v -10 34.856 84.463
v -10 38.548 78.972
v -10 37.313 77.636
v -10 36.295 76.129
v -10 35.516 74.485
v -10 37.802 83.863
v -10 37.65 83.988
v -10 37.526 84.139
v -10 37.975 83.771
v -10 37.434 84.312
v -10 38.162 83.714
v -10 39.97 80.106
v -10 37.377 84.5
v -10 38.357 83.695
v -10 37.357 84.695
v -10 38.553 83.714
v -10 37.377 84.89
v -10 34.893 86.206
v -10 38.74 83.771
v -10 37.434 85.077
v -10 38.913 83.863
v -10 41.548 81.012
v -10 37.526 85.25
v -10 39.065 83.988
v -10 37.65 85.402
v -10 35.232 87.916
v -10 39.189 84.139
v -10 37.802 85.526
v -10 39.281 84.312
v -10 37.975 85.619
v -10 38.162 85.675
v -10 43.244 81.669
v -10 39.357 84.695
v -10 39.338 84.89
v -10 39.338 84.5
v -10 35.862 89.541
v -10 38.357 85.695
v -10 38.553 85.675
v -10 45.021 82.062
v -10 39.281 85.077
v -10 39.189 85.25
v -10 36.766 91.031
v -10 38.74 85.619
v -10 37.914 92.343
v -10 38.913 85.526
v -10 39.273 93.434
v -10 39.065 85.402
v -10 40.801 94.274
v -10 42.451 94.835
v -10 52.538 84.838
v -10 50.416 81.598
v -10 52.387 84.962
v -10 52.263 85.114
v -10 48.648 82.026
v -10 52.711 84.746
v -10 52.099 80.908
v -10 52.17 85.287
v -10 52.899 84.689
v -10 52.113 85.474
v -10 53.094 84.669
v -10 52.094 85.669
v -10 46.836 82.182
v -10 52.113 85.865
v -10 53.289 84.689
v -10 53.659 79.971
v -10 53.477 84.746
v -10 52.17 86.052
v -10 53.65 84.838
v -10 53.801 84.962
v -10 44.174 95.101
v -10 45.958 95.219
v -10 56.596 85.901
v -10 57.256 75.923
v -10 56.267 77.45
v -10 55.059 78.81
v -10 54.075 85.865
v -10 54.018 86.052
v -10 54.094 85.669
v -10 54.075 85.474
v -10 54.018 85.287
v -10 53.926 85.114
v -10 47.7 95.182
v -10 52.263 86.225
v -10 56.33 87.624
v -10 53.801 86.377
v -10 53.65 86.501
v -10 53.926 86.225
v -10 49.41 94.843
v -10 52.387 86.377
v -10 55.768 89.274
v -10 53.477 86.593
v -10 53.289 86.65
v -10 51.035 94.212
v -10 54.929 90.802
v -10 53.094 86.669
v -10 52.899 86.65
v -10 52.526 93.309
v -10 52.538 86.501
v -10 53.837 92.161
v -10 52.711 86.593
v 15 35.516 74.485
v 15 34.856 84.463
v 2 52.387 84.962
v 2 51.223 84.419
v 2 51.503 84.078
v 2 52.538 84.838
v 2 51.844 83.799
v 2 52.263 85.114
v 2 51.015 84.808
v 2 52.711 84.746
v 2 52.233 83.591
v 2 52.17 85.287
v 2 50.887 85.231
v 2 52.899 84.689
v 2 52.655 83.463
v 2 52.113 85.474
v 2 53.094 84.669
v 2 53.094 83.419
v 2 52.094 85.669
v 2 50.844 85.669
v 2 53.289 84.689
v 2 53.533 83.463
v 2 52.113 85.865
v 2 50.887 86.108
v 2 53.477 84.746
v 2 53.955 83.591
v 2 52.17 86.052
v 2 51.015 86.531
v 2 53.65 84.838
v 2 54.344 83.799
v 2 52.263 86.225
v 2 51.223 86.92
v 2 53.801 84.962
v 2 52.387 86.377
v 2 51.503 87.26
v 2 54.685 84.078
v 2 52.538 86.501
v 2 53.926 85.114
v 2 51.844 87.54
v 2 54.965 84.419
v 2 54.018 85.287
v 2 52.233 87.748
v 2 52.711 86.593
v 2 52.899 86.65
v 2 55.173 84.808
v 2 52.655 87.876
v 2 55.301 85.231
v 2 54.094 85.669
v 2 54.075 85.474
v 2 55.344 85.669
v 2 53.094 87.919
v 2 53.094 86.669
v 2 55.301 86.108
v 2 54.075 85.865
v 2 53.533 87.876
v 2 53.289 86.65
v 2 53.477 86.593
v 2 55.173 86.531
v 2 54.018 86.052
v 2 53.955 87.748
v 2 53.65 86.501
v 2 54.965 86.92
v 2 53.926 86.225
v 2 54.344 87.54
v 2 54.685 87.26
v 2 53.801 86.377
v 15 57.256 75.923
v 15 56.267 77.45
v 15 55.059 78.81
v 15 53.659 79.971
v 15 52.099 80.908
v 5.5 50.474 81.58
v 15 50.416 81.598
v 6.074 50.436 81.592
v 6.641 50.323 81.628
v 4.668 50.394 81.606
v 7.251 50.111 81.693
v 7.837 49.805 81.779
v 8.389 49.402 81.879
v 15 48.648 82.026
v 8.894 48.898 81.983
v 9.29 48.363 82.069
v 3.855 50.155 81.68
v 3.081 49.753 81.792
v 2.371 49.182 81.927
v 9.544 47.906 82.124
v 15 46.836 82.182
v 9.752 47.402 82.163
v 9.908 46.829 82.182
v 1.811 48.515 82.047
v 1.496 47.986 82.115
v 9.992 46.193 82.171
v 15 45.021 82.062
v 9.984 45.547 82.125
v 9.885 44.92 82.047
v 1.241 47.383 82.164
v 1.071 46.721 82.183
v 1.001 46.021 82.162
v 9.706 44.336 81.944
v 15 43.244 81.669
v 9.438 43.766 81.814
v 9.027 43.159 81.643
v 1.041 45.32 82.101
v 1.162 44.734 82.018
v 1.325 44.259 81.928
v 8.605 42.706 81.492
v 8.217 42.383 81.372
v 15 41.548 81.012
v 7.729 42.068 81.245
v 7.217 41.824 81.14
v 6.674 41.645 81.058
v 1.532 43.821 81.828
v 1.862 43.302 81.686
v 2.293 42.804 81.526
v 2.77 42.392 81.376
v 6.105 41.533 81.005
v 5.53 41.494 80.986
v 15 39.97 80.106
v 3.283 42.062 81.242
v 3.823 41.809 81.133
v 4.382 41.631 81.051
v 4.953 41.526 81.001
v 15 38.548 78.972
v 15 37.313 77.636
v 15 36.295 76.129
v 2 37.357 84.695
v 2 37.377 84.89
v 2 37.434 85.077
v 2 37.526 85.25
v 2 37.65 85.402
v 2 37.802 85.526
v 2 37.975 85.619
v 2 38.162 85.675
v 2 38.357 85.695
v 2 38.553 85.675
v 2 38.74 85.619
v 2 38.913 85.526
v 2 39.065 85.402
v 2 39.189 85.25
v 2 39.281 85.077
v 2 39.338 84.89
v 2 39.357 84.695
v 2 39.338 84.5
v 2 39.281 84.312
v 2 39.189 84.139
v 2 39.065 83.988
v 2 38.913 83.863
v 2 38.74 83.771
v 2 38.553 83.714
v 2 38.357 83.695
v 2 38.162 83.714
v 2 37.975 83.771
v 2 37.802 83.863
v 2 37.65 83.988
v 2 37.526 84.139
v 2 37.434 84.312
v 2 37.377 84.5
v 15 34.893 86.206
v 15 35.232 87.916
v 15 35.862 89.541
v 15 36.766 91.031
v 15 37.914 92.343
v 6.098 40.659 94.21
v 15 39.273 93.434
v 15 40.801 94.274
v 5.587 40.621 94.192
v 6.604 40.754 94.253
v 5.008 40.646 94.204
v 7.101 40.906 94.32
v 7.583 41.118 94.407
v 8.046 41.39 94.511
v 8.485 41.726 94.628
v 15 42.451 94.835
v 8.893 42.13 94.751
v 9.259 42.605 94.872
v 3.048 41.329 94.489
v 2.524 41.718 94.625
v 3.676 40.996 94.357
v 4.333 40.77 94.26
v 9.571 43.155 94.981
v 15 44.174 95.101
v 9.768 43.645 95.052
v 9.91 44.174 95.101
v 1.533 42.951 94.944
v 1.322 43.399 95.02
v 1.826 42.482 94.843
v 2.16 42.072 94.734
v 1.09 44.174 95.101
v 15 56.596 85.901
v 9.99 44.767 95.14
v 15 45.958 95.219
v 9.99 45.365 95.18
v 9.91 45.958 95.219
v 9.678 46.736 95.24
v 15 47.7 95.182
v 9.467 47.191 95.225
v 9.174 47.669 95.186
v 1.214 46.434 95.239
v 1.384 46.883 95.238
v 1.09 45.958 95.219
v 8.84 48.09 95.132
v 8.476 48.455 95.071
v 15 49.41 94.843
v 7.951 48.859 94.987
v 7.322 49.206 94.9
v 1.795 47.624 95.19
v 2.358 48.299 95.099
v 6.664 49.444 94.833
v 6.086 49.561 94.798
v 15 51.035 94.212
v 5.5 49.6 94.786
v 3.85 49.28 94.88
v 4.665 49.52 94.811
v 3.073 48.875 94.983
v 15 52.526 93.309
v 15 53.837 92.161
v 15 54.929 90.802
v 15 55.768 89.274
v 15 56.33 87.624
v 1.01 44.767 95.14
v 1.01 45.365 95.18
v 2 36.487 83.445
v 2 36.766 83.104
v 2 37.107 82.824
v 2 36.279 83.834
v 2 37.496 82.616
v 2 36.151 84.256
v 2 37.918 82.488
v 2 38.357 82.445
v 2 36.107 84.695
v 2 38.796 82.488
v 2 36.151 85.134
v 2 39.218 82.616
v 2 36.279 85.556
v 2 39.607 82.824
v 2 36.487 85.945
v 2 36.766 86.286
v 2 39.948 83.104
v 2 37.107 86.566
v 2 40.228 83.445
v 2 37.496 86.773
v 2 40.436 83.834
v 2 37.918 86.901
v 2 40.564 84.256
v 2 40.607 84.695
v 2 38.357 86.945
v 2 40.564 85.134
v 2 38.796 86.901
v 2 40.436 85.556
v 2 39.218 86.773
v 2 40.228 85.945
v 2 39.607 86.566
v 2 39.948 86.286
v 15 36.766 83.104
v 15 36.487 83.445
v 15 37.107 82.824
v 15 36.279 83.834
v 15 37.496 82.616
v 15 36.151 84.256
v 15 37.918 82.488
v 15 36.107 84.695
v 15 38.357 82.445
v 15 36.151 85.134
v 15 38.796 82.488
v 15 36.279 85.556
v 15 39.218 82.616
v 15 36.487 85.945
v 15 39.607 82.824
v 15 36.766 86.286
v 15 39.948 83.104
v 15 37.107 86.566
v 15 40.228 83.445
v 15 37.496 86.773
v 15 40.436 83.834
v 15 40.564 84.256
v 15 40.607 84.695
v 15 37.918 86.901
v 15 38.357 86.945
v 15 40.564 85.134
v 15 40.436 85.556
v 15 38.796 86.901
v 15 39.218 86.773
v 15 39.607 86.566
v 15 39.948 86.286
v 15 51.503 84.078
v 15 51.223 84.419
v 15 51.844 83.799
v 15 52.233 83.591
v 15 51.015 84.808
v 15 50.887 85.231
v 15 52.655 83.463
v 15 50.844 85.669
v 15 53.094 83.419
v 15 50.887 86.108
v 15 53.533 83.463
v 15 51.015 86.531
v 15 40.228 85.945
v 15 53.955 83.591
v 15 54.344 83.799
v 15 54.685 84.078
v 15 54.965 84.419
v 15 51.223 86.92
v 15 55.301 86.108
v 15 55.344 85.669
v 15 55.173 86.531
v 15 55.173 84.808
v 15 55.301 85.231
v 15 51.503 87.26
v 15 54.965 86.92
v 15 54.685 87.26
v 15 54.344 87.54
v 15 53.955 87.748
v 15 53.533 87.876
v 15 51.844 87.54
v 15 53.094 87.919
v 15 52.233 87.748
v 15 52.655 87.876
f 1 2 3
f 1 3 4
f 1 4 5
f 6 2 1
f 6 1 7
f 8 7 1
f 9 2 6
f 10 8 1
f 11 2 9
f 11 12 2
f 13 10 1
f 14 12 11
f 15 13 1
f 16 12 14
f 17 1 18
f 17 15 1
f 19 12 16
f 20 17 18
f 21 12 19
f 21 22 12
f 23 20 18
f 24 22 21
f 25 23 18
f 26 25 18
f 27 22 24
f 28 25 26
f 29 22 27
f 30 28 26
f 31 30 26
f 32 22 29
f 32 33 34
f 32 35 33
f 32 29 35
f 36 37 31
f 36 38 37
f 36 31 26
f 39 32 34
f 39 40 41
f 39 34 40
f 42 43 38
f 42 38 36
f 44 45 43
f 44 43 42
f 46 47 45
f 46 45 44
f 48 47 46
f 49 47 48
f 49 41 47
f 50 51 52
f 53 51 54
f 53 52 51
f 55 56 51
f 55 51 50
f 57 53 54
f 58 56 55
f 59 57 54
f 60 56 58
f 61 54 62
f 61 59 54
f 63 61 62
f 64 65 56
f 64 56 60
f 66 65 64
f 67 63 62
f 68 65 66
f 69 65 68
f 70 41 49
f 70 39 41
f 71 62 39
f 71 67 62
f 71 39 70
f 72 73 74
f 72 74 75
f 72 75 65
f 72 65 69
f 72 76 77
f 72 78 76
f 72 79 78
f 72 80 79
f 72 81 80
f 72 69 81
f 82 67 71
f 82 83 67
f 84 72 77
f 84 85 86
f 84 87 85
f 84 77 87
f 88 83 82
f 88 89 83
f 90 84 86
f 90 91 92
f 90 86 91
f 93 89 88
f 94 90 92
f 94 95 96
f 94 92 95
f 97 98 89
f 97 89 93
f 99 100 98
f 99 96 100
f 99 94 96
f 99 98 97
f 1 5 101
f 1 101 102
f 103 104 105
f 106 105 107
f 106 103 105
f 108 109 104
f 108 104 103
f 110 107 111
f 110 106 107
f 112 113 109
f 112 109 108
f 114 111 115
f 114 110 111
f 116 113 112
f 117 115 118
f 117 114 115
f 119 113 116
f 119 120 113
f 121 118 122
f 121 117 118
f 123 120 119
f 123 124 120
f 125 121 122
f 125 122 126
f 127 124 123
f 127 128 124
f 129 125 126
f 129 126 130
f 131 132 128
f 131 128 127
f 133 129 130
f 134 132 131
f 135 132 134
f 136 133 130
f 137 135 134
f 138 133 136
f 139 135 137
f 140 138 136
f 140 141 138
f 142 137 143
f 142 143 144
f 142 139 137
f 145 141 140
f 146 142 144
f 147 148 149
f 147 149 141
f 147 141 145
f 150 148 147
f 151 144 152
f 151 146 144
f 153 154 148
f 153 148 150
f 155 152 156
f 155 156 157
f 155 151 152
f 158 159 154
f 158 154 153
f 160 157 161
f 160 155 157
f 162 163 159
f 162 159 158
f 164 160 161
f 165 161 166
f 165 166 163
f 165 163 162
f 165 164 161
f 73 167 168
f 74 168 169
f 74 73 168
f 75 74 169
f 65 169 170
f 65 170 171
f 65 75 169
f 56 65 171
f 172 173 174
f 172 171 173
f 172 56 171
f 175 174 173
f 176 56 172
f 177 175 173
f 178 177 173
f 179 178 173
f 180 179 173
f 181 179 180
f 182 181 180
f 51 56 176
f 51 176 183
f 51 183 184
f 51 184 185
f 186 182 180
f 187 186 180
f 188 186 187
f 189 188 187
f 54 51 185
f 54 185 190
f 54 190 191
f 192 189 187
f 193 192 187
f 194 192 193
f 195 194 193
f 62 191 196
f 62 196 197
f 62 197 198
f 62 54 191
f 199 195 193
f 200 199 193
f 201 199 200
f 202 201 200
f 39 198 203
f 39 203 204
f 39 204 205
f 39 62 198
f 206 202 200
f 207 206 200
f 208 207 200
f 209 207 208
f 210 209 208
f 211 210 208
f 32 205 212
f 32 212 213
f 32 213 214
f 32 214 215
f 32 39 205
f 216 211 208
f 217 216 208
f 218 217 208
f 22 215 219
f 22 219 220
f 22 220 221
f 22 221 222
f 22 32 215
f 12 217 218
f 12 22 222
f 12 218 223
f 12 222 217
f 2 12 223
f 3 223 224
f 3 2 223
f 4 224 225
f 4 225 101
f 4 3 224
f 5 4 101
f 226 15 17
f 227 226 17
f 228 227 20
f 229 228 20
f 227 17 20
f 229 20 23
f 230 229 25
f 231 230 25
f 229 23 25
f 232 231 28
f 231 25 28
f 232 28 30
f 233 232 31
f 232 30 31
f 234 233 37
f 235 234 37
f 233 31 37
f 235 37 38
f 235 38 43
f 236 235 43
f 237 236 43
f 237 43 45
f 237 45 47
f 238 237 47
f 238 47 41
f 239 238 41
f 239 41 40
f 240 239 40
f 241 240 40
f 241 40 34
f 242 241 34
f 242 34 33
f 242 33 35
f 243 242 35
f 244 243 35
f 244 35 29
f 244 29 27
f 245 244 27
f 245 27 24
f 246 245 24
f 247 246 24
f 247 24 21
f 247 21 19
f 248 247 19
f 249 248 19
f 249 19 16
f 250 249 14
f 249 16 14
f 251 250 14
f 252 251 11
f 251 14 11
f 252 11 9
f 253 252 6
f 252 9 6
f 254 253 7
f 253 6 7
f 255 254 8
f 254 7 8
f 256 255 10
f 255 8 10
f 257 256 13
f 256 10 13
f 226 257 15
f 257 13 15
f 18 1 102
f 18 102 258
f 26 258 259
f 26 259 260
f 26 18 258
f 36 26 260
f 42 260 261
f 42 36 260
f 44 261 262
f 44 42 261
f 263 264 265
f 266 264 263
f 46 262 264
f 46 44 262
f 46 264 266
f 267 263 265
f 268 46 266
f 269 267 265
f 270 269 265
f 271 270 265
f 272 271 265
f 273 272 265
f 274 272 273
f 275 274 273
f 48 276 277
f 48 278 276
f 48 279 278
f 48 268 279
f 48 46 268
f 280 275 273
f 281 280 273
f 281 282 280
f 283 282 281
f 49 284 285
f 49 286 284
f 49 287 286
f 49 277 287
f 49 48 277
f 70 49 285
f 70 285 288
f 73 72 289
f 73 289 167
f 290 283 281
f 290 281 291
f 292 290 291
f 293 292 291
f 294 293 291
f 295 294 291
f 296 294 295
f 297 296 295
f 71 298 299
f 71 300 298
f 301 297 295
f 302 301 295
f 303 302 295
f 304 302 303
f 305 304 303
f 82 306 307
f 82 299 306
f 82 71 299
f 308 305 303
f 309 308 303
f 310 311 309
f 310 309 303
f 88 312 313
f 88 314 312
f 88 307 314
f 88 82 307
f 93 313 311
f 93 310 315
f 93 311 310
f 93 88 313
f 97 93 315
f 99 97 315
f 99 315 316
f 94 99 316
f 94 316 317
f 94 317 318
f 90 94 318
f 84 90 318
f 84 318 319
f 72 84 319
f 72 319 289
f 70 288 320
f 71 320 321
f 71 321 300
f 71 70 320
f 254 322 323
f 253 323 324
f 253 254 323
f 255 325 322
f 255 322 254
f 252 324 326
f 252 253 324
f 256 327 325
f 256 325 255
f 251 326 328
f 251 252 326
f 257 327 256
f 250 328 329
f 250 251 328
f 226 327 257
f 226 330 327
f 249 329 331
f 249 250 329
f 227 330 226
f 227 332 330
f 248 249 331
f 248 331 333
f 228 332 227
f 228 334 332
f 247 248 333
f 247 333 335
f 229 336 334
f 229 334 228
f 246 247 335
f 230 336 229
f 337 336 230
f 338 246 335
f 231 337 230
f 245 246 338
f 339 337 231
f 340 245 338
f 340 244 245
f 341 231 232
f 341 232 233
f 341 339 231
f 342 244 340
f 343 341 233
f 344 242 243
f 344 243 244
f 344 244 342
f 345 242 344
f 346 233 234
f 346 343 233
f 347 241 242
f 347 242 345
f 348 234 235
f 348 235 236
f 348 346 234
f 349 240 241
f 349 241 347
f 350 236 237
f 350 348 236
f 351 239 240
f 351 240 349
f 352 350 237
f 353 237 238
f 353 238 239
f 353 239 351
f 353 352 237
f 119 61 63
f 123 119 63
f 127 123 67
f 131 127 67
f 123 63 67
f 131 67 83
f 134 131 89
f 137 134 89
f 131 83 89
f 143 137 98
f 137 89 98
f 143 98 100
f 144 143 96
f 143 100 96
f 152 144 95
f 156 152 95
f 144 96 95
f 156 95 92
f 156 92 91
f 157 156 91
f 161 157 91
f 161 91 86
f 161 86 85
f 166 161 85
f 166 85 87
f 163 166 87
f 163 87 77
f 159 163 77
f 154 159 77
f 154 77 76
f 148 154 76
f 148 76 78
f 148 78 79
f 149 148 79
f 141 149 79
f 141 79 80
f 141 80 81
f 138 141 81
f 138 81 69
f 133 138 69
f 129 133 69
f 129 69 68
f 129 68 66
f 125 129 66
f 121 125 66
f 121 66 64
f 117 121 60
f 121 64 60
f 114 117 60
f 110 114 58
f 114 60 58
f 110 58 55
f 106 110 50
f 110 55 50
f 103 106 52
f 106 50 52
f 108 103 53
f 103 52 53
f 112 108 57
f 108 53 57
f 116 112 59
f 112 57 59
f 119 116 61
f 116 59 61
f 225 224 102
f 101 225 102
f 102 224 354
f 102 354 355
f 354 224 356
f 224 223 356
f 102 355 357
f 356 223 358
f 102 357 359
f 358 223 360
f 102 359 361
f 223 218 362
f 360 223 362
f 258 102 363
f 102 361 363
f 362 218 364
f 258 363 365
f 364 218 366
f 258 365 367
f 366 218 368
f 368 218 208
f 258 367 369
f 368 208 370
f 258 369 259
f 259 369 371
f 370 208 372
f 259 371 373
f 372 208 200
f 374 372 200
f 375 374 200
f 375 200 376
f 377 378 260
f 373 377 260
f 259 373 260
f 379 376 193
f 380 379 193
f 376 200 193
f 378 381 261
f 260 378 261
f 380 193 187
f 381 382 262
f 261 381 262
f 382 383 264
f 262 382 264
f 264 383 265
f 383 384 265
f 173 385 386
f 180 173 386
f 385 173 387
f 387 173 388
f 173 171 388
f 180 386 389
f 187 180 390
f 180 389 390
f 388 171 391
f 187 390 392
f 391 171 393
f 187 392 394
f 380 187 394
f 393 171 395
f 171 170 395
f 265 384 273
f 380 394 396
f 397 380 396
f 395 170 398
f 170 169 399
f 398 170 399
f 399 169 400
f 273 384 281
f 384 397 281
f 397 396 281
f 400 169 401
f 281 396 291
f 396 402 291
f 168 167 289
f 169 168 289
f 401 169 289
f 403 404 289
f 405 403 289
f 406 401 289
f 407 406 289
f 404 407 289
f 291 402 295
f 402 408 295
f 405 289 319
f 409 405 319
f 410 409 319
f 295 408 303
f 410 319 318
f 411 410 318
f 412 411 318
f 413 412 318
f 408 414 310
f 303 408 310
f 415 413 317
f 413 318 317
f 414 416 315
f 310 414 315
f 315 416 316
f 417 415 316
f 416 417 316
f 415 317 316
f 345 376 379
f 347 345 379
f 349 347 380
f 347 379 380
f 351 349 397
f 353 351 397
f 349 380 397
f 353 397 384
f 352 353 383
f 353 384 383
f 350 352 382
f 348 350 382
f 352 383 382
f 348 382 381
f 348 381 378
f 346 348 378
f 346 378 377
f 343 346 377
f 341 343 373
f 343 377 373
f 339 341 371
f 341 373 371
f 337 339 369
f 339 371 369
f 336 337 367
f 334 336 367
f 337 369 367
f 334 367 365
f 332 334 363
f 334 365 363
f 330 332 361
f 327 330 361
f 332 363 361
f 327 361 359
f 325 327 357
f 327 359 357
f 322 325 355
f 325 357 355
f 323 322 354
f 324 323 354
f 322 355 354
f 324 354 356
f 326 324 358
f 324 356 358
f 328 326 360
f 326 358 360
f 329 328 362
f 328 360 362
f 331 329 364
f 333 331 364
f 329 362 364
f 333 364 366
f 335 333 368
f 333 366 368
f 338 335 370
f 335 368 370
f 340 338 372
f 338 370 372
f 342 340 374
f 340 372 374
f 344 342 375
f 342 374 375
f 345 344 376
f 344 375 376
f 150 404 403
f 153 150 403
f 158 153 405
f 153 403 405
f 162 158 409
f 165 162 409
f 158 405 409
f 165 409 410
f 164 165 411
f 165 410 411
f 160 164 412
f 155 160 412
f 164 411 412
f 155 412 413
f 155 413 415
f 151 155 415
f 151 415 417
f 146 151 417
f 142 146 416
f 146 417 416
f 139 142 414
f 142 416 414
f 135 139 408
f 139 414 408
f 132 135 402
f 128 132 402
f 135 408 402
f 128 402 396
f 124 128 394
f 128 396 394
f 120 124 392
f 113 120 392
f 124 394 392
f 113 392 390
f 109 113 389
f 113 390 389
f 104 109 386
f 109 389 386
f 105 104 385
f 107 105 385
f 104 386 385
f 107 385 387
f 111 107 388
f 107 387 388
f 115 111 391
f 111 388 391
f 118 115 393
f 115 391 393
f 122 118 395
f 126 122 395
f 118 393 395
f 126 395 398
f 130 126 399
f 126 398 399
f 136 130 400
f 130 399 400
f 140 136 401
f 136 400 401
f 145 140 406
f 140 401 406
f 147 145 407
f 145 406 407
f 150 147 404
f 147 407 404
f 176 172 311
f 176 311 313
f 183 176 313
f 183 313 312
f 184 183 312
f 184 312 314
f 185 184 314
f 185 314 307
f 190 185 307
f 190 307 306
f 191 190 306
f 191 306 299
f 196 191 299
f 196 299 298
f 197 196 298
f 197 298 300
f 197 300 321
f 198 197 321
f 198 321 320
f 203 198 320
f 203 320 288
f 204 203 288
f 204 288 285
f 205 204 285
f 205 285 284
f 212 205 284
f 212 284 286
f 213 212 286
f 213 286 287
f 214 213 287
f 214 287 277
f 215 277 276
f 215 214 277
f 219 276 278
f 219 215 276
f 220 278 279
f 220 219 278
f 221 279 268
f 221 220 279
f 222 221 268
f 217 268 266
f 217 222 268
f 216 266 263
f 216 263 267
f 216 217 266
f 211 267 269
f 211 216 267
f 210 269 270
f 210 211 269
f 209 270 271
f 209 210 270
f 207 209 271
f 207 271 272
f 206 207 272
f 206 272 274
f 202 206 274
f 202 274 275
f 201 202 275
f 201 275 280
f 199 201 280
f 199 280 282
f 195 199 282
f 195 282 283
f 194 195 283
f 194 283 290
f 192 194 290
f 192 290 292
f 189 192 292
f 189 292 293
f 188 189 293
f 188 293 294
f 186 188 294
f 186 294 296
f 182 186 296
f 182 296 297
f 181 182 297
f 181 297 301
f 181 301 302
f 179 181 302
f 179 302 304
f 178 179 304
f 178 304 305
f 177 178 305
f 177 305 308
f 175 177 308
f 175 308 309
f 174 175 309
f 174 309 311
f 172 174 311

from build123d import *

# Parameters (mm, degrees)
BOSS_EXTRUDE1_DEPTH     = 25
CUT_EXTRUDE1_DEPTH      = 118.647905993
CUT_EXTRUDE1_DEPTH_BACK = 118.647905993
SKETCH2_R               = 4.5
SKETCH4_R               = 1
CUT_EXTRUDE3_DEPTH      = 114.903893928
SKETCH5_R               = 2.25
CUT_EXTRUDE4_DEPTH      = 13


with BuildPart() as part:
    # Sketch1 → Boss-Extrude1 (new body)
    with BuildSketch(Plane(origin=(-10, 0, 0), x_dir=(0, 0, -1), z_dir=(1, 0, 0))):
        with BuildLine():
            Line((-95.101282582, 44.173788963), (-95.219276466, 45.957628532))
            ThreePointArc((-95.219276466, 45.957628532), (-92.763433913, 53.206592673), (-85.901099289, 56.595841451))
            Line((-85.901099289, 56.595841451), (-75.922904242, 57.255859321))
            ThreePointArc((-75.922904242, 57.255859321), (-82.156438236, 45.925861069), (-74.484874616, 35.515629656))
            Line((-74.484874616, 35.515629656), (-84.463069663, 34.855611786))
            ThreePointArc((-84.463069663, 34.855611786), (-91.712033804, 37.311454339), (-95.101282582, 44.173788963))
        make_face()
    extrude(amount=BOSS_EXTRUDE1_DEPTH)

    # Sketch2 → Cut-Extrude1 (cut, two sides: drawn at the far end of the back side and taken through both)
    with BuildSketch(Plane(origin=(0, 0.216574413, -6.555528357), x_dir=(1, 0, 0), z_dir=(0, -0.06600178707669223, 0.9978195047716211)).offset(-CUT_EXTRUDE1_DEPTH_BACK)):
        with Locations(Location((5.5, 51.464766105, 0), (0, 0, 90))):
            Circle(SKETCH2_R)
    extrude(amount=CUT_EXTRUDE1_DEPTH + CUT_EXTRUDE1_DEPTH_BACK, mode=Mode.SUBTRACT)

    # Sketch4 → Cut-Extrude3 (cut, through all)
    with BuildSketch(Plane.ZY.offset(10)):
        with Locations(Location((85.669468509, 53.094031558, 0), (0, 0, 270))):
            Circle(SKETCH4_R)
        with Locations(Location((84.694700444, 38.357421678, 0), (0, 0, 270))):
            Circle(SKETCH4_R)
    extrude(amount=-CUT_EXTRUDE3_DEPTH, mode=Mode.SUBTRACT)

    # Sketch5 → Cut-Extrude4 (cut)
    with BuildSketch(Plane(origin=(15, 0, 0), x_dir=(0, 0, -1), z_dir=(1, 0, 0))):
        with Locations(Location((-84.694700444, 38.357421678, 0), (0, 0, 90))):
            Circle(SKETCH5_R)
        with Locations(Location((-85.669468509, 53.094031558, 0), (0, 0, 90))):
            Circle(SKETCH5_R)
    extrude(amount=-CUT_EXTRUDE4_DEPTH, mode=Mode.SUBTRACT)


solid = part.part
